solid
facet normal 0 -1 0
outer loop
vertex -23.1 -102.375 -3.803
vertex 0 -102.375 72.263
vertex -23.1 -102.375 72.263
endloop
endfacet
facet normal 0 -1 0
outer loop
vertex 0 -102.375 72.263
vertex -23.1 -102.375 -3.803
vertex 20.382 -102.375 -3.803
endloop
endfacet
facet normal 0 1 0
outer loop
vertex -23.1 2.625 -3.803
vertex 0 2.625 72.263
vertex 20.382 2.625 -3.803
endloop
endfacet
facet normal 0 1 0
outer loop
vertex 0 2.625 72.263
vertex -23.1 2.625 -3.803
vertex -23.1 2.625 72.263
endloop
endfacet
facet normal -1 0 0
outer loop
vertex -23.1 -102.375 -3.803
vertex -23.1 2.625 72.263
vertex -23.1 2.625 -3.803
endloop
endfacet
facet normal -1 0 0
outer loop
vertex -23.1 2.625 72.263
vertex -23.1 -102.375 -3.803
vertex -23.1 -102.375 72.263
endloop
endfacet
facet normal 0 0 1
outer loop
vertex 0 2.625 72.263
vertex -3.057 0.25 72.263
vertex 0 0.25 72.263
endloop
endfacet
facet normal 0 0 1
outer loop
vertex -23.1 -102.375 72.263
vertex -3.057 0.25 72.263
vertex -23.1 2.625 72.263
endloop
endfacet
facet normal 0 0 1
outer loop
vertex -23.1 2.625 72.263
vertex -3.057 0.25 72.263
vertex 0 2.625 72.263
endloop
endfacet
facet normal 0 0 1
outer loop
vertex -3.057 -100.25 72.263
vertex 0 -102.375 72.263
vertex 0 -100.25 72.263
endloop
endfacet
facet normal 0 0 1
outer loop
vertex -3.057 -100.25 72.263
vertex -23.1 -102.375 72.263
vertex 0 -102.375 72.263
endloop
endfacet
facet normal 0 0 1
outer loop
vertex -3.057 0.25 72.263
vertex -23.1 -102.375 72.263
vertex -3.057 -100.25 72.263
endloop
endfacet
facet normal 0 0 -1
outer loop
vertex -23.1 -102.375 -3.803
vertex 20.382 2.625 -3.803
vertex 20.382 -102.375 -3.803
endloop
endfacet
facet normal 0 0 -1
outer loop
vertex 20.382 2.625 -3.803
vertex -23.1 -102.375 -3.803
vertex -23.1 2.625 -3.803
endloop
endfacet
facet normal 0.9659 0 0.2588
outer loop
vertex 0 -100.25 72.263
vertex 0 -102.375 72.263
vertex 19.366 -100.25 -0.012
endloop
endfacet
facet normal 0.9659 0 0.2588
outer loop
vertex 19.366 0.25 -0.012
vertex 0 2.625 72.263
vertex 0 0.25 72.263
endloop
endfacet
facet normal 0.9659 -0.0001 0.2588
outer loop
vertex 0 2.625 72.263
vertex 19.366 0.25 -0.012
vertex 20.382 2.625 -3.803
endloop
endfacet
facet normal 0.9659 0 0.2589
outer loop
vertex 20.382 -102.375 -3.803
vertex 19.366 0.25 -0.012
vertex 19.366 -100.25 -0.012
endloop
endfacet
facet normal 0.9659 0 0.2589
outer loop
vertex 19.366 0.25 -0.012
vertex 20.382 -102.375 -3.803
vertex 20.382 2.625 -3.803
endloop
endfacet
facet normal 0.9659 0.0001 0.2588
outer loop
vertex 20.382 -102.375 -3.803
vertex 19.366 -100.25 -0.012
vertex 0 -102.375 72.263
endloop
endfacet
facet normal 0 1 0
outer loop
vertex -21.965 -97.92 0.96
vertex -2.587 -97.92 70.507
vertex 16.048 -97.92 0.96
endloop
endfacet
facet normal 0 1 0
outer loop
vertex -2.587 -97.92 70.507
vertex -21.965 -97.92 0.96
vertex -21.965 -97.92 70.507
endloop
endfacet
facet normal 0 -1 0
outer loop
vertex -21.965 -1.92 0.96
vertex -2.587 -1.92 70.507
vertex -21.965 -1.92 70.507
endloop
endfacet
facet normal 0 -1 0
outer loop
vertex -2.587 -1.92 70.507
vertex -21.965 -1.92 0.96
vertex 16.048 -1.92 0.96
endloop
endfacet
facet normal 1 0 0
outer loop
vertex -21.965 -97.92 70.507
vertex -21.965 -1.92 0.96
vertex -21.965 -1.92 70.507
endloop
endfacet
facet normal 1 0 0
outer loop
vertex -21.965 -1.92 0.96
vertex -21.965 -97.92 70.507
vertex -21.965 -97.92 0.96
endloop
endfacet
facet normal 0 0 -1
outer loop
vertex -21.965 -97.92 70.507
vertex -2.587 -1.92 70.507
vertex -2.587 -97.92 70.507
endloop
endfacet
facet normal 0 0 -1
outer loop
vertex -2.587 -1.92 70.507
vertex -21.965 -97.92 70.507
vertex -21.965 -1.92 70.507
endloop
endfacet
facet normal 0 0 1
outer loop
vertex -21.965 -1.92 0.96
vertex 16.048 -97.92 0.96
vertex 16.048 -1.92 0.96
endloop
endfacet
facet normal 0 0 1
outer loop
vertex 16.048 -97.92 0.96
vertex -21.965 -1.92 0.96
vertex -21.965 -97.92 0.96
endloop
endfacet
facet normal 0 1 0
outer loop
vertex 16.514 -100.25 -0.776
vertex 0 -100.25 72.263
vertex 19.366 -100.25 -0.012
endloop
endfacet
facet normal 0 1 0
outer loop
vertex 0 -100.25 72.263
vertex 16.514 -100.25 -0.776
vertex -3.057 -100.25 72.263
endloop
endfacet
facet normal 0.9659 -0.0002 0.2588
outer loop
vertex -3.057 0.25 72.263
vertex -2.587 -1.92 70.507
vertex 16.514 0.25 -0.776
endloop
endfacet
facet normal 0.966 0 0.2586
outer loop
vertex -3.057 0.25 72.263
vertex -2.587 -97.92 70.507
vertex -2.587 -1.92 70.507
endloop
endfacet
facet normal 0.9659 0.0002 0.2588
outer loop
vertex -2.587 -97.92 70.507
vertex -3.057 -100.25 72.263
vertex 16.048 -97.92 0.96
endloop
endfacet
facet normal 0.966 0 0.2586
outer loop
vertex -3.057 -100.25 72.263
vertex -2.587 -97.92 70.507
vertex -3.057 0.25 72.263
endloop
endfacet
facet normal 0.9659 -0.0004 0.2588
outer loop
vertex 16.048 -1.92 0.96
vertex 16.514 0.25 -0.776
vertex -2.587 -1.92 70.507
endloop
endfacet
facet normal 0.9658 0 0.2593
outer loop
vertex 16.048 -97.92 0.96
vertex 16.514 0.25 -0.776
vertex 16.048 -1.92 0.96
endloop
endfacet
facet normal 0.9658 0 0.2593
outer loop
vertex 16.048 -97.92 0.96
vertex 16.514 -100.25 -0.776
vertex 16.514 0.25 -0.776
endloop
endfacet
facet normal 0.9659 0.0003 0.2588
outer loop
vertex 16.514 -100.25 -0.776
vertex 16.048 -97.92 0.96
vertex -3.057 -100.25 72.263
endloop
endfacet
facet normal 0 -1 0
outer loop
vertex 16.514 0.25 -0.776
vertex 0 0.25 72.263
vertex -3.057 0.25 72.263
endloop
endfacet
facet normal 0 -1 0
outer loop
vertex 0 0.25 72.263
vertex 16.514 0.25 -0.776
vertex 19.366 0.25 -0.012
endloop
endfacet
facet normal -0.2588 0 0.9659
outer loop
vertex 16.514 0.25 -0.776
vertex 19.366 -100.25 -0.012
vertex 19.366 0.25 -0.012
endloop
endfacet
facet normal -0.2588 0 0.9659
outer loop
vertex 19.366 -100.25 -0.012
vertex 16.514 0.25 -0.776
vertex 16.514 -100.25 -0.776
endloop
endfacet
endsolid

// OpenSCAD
// The width of the lithophane (mm)
pic_width = 100;

// The height of the lithophane (mm)
pic_height = 75;

// The maximum depth of the lithophane (mm)
pic_depth = 3;

// Desired viewing angle (degrees)
angle = 75; //[40:90]

// extra depth to add to the frame (mm), measured from the top of the frame. Important for making sure there is enough room for lights/batteries
top_depth = 22;

rotate([90,0,0]) lightbox(pic_width, pic_height, pic_depth, angle);

module lightbox(w,h,d,angle) {
    base_len = adj_len(angle, h);
    base_height = opp_len(angle, h);
    echo(base_len);

    difference(){
        union(){
            scale([1.05, 1.05, 1.05]) {
                translate([0, -base_height * 0.05, (-w * 0.05)/2]) wedge(base_height, base_len, w, top_depth);
            }
        }
        union(){
            scale([.96,.96,.96]){
                translate([0,1,(w*0.04) / 2]) wedge(base_height, base_len, w, top_depth * 1.04);
            }
        }
        union(){
            translate([base_len - opp_len(angle,d),-adj_len(angle,d),-0.25]) rotate([0,0, 90-angle]) box([d+0.2,h+50,w+0.5]);
        }

    }
}

module wedge(tri_h, tri_w, extrude, extra_depth) {
    union(){
        union() {
            translate([-extra_depth, 0, 0]) box([extra_depth, tri_h, extrude]);
        }
        linear_extrude(height=extrude){
            polygon(points=[[0,0],[tri_w,0],[0,tri_h]]);
        }
    }
}

module box(args) {
    cube(args);
}

function adj_len (theta, hippo) = cos(theta) * hippo;
function opp_len (theta, hippo) = sin(theta) * hippo;
